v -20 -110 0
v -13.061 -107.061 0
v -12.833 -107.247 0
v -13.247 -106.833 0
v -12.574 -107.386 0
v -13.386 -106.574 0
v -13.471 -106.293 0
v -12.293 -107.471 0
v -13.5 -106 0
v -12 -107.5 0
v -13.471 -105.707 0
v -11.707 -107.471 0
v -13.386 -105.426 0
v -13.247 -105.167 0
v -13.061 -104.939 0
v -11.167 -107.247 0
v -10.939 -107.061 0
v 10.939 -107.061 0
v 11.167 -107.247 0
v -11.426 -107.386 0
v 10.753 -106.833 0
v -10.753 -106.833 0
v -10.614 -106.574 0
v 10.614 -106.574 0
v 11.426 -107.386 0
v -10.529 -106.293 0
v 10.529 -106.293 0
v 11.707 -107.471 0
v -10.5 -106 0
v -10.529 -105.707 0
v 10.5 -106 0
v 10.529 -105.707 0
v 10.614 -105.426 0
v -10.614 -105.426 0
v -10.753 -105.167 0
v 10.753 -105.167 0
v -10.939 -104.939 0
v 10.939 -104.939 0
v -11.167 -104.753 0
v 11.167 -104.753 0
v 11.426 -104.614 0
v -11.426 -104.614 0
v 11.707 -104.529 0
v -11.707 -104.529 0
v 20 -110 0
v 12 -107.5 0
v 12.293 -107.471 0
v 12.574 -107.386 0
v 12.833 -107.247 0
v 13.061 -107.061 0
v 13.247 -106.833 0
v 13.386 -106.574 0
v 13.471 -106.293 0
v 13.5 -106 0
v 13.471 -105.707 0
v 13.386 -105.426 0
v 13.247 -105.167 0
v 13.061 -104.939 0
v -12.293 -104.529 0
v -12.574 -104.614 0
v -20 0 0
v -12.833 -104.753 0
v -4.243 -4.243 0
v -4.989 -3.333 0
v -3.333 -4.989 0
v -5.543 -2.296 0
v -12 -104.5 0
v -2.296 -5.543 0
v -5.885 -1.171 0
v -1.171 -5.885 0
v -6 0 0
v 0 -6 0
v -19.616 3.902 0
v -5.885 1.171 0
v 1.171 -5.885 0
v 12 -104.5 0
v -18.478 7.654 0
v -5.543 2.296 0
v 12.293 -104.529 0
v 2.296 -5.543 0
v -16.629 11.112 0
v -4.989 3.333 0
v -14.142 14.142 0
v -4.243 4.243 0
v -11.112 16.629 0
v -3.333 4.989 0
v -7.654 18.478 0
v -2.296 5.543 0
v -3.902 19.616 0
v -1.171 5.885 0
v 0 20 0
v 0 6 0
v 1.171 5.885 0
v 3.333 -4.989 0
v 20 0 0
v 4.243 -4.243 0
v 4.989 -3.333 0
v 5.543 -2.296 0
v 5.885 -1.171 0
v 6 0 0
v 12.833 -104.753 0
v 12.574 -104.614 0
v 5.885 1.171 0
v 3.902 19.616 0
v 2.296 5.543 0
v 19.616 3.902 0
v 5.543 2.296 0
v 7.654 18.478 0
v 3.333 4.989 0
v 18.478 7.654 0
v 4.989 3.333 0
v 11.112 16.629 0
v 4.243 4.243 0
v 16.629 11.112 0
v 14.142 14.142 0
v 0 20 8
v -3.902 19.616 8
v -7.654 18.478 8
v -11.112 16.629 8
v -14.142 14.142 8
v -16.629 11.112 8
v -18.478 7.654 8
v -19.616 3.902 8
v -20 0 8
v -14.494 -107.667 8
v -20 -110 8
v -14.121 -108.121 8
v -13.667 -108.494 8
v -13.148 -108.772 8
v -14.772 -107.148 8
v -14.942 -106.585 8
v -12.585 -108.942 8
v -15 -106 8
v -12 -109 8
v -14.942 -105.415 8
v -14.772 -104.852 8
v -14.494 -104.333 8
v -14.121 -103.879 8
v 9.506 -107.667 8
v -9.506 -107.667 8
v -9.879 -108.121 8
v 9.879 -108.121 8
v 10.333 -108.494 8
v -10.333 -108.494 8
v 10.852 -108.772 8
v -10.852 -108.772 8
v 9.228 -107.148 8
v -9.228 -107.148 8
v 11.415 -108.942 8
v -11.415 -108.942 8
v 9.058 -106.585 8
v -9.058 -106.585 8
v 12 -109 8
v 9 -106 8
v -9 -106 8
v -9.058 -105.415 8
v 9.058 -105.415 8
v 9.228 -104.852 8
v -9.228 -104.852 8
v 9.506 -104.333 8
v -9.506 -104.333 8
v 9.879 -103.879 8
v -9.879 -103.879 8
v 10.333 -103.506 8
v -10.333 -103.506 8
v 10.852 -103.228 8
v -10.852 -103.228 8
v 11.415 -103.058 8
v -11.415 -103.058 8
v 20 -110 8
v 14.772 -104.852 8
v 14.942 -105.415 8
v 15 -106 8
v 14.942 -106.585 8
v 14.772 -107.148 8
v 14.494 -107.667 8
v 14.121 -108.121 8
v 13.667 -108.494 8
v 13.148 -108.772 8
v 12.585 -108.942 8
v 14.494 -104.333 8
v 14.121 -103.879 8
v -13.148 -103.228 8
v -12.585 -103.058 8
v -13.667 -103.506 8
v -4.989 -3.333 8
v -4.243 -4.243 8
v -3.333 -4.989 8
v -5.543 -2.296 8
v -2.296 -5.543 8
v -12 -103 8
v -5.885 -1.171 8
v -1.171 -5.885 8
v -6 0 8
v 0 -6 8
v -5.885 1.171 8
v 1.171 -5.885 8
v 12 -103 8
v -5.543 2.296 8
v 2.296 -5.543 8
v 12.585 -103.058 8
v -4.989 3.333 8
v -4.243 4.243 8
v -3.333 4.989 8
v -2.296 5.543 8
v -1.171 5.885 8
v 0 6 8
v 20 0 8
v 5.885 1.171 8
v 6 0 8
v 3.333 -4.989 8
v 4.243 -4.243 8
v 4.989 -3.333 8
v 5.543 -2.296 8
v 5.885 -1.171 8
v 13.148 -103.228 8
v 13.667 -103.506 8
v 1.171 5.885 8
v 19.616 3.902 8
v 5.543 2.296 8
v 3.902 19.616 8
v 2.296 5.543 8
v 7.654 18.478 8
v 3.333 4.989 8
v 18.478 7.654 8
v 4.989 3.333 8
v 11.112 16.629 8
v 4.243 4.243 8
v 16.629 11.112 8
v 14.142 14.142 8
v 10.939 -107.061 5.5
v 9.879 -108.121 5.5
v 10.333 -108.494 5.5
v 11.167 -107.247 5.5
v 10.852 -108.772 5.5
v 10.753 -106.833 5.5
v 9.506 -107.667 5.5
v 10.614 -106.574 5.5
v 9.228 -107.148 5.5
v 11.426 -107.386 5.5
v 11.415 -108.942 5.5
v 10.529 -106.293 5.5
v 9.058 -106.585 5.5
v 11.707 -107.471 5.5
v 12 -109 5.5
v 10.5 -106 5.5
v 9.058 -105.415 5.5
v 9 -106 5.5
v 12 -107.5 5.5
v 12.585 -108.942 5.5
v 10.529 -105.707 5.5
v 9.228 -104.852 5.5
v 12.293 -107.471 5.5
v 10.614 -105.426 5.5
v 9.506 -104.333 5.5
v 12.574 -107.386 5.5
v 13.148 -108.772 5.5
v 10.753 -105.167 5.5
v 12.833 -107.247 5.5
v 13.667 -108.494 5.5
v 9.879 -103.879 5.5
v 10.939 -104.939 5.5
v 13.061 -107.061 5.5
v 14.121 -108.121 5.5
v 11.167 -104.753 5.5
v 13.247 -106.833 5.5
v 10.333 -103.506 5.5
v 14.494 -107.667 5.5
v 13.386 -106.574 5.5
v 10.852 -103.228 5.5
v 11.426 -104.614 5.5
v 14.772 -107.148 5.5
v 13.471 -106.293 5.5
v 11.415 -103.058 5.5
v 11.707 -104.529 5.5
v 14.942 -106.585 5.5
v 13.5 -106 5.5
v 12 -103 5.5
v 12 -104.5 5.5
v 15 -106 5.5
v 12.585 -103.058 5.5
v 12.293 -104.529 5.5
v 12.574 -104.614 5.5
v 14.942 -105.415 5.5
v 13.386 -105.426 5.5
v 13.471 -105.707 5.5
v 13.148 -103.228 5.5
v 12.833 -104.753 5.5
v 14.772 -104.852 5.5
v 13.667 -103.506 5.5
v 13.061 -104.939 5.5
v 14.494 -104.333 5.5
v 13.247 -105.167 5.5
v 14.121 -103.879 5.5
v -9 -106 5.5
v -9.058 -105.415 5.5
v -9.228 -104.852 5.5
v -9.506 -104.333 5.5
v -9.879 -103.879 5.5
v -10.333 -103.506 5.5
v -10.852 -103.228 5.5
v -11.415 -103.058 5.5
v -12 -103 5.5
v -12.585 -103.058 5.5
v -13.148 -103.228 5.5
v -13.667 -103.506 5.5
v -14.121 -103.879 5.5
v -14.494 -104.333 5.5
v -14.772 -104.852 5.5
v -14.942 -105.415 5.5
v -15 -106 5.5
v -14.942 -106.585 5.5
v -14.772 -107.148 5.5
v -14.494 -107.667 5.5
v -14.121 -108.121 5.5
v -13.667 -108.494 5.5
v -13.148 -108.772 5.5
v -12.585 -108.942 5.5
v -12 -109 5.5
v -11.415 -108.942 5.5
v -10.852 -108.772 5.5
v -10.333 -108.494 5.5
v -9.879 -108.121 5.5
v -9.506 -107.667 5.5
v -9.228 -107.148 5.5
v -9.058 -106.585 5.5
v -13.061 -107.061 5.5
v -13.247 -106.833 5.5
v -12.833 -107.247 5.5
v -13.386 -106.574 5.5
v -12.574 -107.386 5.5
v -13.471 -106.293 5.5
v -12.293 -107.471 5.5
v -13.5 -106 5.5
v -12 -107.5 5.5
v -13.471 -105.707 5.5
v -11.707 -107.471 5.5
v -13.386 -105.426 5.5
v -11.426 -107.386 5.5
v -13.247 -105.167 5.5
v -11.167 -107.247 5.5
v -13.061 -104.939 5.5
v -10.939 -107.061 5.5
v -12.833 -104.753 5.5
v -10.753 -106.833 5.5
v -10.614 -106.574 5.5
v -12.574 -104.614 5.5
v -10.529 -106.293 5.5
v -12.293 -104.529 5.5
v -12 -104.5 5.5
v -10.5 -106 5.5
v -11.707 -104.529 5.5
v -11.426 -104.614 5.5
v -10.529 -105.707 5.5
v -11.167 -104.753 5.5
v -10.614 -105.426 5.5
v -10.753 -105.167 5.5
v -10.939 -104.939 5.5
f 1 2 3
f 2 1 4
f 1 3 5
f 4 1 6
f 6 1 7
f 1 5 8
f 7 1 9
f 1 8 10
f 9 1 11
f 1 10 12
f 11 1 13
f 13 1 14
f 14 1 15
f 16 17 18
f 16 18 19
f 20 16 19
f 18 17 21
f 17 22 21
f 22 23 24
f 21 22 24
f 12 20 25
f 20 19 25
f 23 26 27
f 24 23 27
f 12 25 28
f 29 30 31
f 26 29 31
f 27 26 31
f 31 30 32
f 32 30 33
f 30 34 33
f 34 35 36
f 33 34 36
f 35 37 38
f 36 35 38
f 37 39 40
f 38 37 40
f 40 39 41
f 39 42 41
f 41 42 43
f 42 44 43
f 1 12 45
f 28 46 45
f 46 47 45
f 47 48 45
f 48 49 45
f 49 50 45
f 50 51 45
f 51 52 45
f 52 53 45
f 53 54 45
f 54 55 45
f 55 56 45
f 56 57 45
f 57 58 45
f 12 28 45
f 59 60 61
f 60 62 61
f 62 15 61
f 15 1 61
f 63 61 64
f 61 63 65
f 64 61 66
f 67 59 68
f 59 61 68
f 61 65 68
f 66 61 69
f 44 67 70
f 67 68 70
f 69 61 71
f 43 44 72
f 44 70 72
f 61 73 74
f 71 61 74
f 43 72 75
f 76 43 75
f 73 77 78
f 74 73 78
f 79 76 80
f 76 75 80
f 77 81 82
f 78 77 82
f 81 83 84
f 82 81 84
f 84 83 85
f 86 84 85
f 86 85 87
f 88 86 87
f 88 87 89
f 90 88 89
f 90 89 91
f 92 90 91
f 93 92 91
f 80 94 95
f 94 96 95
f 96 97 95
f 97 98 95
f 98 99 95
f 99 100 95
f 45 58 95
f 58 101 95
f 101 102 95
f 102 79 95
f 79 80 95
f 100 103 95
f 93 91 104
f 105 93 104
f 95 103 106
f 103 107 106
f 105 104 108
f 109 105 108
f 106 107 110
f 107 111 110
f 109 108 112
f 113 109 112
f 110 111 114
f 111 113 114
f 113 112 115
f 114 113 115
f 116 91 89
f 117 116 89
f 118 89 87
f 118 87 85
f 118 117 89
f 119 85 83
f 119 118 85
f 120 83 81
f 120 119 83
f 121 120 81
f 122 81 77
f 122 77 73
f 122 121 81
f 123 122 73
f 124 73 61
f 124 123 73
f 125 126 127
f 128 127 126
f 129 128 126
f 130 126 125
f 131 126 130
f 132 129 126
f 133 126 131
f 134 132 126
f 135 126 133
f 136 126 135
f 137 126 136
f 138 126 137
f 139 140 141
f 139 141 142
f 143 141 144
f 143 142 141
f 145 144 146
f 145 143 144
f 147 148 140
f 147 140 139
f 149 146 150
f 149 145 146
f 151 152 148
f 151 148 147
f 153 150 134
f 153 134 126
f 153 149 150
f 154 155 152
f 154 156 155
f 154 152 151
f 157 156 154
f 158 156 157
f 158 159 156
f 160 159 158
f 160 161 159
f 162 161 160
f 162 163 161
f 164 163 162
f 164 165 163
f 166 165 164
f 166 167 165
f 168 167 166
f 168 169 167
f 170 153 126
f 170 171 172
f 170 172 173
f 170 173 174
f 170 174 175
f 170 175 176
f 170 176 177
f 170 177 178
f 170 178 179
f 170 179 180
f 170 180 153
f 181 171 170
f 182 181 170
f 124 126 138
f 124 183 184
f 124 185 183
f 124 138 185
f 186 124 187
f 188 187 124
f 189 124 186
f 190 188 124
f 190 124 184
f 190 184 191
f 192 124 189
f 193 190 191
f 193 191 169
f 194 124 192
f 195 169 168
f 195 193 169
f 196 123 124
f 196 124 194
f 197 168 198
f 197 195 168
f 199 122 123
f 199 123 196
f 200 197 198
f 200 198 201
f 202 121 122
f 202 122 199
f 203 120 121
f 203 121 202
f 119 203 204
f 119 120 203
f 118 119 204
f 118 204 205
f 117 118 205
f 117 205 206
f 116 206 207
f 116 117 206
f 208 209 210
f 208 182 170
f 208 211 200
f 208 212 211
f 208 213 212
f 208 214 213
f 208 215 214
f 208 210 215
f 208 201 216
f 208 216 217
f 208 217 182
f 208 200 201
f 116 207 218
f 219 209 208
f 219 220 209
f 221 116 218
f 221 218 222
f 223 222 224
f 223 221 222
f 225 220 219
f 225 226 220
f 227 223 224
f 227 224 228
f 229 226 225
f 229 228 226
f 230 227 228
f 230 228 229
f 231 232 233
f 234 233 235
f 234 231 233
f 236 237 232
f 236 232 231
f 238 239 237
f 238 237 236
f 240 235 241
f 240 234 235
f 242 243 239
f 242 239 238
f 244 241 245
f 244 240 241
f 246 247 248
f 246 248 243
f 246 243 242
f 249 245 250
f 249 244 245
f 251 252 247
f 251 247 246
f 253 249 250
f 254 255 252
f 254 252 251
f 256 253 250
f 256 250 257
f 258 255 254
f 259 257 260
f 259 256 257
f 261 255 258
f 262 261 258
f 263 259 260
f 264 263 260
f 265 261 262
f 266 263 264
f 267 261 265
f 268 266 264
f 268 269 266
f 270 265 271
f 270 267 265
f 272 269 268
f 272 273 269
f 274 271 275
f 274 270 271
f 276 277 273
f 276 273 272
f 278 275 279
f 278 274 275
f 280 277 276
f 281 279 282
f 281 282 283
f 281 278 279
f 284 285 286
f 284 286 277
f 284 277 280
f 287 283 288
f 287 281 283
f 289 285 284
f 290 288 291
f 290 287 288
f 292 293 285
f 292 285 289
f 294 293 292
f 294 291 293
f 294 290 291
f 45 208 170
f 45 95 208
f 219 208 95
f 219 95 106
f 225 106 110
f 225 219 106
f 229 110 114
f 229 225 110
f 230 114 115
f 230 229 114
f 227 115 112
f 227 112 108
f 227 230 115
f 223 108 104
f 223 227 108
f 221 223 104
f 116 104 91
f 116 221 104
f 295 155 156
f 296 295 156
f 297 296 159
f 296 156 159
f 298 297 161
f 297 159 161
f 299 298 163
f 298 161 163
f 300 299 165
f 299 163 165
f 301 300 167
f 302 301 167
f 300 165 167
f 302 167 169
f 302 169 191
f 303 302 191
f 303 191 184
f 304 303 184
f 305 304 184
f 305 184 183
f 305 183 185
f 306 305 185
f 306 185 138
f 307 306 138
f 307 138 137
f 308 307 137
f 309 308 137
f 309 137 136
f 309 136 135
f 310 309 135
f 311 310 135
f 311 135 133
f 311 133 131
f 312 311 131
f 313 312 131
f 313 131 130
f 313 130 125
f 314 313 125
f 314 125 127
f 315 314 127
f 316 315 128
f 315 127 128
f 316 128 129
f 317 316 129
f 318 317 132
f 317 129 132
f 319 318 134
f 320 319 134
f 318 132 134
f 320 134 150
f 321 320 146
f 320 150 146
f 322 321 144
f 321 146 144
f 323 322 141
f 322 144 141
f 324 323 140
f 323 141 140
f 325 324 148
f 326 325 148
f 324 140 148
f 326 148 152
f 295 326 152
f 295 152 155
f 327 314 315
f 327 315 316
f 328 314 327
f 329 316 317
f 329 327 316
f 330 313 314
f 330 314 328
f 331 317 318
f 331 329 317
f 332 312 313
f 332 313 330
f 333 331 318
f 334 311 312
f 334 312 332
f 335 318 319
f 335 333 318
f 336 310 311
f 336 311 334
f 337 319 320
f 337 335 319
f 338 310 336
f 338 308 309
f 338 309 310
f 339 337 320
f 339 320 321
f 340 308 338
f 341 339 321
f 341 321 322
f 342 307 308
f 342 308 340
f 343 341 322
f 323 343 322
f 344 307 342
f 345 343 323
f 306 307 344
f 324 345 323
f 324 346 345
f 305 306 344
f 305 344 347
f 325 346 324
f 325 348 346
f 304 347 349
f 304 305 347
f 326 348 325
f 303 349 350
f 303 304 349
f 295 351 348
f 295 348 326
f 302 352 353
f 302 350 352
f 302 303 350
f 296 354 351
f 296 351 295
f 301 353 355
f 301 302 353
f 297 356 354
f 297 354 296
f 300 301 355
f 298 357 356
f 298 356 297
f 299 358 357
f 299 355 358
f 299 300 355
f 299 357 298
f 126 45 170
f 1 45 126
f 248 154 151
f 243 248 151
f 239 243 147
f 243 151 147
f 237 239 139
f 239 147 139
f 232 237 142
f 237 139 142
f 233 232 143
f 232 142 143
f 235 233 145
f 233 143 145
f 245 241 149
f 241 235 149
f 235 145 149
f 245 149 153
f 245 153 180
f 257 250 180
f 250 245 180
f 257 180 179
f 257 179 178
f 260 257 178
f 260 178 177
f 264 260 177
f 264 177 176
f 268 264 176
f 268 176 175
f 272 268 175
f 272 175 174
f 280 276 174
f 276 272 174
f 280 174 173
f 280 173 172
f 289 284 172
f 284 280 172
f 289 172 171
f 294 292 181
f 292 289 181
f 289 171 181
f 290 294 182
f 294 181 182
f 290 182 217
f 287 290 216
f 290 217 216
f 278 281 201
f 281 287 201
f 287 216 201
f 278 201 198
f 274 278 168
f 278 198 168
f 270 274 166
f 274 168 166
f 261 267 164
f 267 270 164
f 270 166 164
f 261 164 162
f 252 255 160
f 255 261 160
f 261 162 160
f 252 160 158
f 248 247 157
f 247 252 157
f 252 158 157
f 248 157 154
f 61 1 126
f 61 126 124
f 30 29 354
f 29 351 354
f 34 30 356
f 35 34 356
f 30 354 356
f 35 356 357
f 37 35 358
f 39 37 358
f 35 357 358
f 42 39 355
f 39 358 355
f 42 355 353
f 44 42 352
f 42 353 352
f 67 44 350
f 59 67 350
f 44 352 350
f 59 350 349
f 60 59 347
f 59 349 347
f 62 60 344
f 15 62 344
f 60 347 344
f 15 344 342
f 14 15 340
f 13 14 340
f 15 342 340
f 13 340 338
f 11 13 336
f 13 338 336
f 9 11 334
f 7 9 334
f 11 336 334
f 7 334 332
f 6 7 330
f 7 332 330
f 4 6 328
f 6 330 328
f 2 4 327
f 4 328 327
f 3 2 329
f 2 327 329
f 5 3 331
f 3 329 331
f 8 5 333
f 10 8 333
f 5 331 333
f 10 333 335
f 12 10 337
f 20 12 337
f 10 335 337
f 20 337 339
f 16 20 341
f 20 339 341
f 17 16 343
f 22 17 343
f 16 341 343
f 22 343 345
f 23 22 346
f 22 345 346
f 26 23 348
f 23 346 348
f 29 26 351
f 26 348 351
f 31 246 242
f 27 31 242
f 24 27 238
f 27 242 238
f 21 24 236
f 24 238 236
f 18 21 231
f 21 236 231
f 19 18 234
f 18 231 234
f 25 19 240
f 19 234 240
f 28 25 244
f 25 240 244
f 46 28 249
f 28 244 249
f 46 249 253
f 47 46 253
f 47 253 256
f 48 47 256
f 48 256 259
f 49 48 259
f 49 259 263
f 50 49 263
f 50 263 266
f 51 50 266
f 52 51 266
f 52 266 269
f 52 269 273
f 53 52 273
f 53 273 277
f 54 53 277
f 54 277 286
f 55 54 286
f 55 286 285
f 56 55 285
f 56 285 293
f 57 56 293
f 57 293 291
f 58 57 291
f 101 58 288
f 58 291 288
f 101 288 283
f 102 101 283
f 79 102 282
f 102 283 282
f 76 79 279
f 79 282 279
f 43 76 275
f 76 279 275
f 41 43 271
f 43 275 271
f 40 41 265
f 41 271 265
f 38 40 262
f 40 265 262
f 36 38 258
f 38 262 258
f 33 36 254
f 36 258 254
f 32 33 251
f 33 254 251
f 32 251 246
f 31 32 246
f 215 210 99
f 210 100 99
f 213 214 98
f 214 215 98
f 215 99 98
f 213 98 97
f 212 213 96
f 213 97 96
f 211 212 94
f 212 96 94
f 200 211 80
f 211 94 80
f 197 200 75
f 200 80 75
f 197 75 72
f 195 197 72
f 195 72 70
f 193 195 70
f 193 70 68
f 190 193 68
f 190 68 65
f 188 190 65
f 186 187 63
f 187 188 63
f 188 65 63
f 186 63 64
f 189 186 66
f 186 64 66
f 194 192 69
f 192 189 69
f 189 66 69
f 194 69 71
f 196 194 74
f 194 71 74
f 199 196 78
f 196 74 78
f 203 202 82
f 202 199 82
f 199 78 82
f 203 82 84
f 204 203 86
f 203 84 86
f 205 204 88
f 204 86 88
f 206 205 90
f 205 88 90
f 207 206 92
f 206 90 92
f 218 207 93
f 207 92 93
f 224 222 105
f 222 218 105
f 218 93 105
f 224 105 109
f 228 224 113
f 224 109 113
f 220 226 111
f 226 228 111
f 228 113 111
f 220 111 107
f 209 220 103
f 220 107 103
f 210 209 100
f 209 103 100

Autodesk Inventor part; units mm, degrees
ref_plane "YZ Plane" through (0, 0, 0) normal (1, 0, 0) x (0, 1, 0)
ref_plane "XZ Plane" through (0, 0, 0) normal (0, 1, 0) x (-1, 0, 0)
ref_plane "XY Plane" through (0, 0, 0) normal (0, 0, 1) x (1, 0, 0)
sketch "Sketch1" plane through (0, 0, 0) normal (0, 0, 1) x (1, 0, 0)
  circle A0 centre (0, 0) radius 6
  line L0 (20, 20) -> (20, -20)
  line L1 (20, -20) -> (-20, -20)
  line L2 (-20, -20) -> (-20, 20)
  line L3 (-20, 20) -> (20, 20)
  line L4 (-20, -20) -> (20, -20)
  line L5 (20, -20) -> (20, -110)
  line L6 (20, -110) -> (-20, -110)
  line L7 (-20, -110) -> (-20, -20)
  dimension "d0" = 12
  dimension "d1" = 40
  dimension "d5" = 110
extrude "Extrusion1" add sketch "Sketch1" along normal blind 8
fillet "Fillet1" radius 20 2 edges at (20, 20, 4) (-20, 20, 4)
sketch "Sketch2" plane through (0, 0, 8) normal (0, 0, 1) x (1, 0, 0)
  line L0 (20, -110) -> (-20, -110) construction
  line L1 (-20, -110) -> (-20, 0) construction
  line L2 (20, 0) -> (20, -110) construction
  line L3 (-20, -110) -> (20, -110) construction
  line L4 (20, -110) -> (20, -102) construction
  line L5 (20, -102) -> (-20, -102) construction
  line L6 (-20, -102) -> (-20, -110) construction
  line L7 (0, -102) -> (0, -110) construction
  line L8 (0, -106) -> (-12, -106) construction
  circle A0 centre (-12, -106) radius 1.5
  point P0 (0, 0)
  dimension "d7" = 8
  dimension "d8" = 3
  dimension "d14" = 12
extrude "Extrusion2" cut sketch "Sketch2" against normal through all
sketch "Sketch3" plane through (0, 0, 8) normal (0, 0, 1) x (1, 0, 0)
  circle A0 centre (-12, -106) radius 1.5 projected
  circle A1 centre (-12, -106) radius 3
  point P0 (0, 0)
  dimension "d11" = 6
extrude "Extrusion3" cut sketch "Sketch3" against normal blind 2.5
mirror "Mirror1" about plane through (0, 0, 0) normal (1, 0, 0) of "Extrusion2", "Extrusion3"
properties part number "Bearing10"
